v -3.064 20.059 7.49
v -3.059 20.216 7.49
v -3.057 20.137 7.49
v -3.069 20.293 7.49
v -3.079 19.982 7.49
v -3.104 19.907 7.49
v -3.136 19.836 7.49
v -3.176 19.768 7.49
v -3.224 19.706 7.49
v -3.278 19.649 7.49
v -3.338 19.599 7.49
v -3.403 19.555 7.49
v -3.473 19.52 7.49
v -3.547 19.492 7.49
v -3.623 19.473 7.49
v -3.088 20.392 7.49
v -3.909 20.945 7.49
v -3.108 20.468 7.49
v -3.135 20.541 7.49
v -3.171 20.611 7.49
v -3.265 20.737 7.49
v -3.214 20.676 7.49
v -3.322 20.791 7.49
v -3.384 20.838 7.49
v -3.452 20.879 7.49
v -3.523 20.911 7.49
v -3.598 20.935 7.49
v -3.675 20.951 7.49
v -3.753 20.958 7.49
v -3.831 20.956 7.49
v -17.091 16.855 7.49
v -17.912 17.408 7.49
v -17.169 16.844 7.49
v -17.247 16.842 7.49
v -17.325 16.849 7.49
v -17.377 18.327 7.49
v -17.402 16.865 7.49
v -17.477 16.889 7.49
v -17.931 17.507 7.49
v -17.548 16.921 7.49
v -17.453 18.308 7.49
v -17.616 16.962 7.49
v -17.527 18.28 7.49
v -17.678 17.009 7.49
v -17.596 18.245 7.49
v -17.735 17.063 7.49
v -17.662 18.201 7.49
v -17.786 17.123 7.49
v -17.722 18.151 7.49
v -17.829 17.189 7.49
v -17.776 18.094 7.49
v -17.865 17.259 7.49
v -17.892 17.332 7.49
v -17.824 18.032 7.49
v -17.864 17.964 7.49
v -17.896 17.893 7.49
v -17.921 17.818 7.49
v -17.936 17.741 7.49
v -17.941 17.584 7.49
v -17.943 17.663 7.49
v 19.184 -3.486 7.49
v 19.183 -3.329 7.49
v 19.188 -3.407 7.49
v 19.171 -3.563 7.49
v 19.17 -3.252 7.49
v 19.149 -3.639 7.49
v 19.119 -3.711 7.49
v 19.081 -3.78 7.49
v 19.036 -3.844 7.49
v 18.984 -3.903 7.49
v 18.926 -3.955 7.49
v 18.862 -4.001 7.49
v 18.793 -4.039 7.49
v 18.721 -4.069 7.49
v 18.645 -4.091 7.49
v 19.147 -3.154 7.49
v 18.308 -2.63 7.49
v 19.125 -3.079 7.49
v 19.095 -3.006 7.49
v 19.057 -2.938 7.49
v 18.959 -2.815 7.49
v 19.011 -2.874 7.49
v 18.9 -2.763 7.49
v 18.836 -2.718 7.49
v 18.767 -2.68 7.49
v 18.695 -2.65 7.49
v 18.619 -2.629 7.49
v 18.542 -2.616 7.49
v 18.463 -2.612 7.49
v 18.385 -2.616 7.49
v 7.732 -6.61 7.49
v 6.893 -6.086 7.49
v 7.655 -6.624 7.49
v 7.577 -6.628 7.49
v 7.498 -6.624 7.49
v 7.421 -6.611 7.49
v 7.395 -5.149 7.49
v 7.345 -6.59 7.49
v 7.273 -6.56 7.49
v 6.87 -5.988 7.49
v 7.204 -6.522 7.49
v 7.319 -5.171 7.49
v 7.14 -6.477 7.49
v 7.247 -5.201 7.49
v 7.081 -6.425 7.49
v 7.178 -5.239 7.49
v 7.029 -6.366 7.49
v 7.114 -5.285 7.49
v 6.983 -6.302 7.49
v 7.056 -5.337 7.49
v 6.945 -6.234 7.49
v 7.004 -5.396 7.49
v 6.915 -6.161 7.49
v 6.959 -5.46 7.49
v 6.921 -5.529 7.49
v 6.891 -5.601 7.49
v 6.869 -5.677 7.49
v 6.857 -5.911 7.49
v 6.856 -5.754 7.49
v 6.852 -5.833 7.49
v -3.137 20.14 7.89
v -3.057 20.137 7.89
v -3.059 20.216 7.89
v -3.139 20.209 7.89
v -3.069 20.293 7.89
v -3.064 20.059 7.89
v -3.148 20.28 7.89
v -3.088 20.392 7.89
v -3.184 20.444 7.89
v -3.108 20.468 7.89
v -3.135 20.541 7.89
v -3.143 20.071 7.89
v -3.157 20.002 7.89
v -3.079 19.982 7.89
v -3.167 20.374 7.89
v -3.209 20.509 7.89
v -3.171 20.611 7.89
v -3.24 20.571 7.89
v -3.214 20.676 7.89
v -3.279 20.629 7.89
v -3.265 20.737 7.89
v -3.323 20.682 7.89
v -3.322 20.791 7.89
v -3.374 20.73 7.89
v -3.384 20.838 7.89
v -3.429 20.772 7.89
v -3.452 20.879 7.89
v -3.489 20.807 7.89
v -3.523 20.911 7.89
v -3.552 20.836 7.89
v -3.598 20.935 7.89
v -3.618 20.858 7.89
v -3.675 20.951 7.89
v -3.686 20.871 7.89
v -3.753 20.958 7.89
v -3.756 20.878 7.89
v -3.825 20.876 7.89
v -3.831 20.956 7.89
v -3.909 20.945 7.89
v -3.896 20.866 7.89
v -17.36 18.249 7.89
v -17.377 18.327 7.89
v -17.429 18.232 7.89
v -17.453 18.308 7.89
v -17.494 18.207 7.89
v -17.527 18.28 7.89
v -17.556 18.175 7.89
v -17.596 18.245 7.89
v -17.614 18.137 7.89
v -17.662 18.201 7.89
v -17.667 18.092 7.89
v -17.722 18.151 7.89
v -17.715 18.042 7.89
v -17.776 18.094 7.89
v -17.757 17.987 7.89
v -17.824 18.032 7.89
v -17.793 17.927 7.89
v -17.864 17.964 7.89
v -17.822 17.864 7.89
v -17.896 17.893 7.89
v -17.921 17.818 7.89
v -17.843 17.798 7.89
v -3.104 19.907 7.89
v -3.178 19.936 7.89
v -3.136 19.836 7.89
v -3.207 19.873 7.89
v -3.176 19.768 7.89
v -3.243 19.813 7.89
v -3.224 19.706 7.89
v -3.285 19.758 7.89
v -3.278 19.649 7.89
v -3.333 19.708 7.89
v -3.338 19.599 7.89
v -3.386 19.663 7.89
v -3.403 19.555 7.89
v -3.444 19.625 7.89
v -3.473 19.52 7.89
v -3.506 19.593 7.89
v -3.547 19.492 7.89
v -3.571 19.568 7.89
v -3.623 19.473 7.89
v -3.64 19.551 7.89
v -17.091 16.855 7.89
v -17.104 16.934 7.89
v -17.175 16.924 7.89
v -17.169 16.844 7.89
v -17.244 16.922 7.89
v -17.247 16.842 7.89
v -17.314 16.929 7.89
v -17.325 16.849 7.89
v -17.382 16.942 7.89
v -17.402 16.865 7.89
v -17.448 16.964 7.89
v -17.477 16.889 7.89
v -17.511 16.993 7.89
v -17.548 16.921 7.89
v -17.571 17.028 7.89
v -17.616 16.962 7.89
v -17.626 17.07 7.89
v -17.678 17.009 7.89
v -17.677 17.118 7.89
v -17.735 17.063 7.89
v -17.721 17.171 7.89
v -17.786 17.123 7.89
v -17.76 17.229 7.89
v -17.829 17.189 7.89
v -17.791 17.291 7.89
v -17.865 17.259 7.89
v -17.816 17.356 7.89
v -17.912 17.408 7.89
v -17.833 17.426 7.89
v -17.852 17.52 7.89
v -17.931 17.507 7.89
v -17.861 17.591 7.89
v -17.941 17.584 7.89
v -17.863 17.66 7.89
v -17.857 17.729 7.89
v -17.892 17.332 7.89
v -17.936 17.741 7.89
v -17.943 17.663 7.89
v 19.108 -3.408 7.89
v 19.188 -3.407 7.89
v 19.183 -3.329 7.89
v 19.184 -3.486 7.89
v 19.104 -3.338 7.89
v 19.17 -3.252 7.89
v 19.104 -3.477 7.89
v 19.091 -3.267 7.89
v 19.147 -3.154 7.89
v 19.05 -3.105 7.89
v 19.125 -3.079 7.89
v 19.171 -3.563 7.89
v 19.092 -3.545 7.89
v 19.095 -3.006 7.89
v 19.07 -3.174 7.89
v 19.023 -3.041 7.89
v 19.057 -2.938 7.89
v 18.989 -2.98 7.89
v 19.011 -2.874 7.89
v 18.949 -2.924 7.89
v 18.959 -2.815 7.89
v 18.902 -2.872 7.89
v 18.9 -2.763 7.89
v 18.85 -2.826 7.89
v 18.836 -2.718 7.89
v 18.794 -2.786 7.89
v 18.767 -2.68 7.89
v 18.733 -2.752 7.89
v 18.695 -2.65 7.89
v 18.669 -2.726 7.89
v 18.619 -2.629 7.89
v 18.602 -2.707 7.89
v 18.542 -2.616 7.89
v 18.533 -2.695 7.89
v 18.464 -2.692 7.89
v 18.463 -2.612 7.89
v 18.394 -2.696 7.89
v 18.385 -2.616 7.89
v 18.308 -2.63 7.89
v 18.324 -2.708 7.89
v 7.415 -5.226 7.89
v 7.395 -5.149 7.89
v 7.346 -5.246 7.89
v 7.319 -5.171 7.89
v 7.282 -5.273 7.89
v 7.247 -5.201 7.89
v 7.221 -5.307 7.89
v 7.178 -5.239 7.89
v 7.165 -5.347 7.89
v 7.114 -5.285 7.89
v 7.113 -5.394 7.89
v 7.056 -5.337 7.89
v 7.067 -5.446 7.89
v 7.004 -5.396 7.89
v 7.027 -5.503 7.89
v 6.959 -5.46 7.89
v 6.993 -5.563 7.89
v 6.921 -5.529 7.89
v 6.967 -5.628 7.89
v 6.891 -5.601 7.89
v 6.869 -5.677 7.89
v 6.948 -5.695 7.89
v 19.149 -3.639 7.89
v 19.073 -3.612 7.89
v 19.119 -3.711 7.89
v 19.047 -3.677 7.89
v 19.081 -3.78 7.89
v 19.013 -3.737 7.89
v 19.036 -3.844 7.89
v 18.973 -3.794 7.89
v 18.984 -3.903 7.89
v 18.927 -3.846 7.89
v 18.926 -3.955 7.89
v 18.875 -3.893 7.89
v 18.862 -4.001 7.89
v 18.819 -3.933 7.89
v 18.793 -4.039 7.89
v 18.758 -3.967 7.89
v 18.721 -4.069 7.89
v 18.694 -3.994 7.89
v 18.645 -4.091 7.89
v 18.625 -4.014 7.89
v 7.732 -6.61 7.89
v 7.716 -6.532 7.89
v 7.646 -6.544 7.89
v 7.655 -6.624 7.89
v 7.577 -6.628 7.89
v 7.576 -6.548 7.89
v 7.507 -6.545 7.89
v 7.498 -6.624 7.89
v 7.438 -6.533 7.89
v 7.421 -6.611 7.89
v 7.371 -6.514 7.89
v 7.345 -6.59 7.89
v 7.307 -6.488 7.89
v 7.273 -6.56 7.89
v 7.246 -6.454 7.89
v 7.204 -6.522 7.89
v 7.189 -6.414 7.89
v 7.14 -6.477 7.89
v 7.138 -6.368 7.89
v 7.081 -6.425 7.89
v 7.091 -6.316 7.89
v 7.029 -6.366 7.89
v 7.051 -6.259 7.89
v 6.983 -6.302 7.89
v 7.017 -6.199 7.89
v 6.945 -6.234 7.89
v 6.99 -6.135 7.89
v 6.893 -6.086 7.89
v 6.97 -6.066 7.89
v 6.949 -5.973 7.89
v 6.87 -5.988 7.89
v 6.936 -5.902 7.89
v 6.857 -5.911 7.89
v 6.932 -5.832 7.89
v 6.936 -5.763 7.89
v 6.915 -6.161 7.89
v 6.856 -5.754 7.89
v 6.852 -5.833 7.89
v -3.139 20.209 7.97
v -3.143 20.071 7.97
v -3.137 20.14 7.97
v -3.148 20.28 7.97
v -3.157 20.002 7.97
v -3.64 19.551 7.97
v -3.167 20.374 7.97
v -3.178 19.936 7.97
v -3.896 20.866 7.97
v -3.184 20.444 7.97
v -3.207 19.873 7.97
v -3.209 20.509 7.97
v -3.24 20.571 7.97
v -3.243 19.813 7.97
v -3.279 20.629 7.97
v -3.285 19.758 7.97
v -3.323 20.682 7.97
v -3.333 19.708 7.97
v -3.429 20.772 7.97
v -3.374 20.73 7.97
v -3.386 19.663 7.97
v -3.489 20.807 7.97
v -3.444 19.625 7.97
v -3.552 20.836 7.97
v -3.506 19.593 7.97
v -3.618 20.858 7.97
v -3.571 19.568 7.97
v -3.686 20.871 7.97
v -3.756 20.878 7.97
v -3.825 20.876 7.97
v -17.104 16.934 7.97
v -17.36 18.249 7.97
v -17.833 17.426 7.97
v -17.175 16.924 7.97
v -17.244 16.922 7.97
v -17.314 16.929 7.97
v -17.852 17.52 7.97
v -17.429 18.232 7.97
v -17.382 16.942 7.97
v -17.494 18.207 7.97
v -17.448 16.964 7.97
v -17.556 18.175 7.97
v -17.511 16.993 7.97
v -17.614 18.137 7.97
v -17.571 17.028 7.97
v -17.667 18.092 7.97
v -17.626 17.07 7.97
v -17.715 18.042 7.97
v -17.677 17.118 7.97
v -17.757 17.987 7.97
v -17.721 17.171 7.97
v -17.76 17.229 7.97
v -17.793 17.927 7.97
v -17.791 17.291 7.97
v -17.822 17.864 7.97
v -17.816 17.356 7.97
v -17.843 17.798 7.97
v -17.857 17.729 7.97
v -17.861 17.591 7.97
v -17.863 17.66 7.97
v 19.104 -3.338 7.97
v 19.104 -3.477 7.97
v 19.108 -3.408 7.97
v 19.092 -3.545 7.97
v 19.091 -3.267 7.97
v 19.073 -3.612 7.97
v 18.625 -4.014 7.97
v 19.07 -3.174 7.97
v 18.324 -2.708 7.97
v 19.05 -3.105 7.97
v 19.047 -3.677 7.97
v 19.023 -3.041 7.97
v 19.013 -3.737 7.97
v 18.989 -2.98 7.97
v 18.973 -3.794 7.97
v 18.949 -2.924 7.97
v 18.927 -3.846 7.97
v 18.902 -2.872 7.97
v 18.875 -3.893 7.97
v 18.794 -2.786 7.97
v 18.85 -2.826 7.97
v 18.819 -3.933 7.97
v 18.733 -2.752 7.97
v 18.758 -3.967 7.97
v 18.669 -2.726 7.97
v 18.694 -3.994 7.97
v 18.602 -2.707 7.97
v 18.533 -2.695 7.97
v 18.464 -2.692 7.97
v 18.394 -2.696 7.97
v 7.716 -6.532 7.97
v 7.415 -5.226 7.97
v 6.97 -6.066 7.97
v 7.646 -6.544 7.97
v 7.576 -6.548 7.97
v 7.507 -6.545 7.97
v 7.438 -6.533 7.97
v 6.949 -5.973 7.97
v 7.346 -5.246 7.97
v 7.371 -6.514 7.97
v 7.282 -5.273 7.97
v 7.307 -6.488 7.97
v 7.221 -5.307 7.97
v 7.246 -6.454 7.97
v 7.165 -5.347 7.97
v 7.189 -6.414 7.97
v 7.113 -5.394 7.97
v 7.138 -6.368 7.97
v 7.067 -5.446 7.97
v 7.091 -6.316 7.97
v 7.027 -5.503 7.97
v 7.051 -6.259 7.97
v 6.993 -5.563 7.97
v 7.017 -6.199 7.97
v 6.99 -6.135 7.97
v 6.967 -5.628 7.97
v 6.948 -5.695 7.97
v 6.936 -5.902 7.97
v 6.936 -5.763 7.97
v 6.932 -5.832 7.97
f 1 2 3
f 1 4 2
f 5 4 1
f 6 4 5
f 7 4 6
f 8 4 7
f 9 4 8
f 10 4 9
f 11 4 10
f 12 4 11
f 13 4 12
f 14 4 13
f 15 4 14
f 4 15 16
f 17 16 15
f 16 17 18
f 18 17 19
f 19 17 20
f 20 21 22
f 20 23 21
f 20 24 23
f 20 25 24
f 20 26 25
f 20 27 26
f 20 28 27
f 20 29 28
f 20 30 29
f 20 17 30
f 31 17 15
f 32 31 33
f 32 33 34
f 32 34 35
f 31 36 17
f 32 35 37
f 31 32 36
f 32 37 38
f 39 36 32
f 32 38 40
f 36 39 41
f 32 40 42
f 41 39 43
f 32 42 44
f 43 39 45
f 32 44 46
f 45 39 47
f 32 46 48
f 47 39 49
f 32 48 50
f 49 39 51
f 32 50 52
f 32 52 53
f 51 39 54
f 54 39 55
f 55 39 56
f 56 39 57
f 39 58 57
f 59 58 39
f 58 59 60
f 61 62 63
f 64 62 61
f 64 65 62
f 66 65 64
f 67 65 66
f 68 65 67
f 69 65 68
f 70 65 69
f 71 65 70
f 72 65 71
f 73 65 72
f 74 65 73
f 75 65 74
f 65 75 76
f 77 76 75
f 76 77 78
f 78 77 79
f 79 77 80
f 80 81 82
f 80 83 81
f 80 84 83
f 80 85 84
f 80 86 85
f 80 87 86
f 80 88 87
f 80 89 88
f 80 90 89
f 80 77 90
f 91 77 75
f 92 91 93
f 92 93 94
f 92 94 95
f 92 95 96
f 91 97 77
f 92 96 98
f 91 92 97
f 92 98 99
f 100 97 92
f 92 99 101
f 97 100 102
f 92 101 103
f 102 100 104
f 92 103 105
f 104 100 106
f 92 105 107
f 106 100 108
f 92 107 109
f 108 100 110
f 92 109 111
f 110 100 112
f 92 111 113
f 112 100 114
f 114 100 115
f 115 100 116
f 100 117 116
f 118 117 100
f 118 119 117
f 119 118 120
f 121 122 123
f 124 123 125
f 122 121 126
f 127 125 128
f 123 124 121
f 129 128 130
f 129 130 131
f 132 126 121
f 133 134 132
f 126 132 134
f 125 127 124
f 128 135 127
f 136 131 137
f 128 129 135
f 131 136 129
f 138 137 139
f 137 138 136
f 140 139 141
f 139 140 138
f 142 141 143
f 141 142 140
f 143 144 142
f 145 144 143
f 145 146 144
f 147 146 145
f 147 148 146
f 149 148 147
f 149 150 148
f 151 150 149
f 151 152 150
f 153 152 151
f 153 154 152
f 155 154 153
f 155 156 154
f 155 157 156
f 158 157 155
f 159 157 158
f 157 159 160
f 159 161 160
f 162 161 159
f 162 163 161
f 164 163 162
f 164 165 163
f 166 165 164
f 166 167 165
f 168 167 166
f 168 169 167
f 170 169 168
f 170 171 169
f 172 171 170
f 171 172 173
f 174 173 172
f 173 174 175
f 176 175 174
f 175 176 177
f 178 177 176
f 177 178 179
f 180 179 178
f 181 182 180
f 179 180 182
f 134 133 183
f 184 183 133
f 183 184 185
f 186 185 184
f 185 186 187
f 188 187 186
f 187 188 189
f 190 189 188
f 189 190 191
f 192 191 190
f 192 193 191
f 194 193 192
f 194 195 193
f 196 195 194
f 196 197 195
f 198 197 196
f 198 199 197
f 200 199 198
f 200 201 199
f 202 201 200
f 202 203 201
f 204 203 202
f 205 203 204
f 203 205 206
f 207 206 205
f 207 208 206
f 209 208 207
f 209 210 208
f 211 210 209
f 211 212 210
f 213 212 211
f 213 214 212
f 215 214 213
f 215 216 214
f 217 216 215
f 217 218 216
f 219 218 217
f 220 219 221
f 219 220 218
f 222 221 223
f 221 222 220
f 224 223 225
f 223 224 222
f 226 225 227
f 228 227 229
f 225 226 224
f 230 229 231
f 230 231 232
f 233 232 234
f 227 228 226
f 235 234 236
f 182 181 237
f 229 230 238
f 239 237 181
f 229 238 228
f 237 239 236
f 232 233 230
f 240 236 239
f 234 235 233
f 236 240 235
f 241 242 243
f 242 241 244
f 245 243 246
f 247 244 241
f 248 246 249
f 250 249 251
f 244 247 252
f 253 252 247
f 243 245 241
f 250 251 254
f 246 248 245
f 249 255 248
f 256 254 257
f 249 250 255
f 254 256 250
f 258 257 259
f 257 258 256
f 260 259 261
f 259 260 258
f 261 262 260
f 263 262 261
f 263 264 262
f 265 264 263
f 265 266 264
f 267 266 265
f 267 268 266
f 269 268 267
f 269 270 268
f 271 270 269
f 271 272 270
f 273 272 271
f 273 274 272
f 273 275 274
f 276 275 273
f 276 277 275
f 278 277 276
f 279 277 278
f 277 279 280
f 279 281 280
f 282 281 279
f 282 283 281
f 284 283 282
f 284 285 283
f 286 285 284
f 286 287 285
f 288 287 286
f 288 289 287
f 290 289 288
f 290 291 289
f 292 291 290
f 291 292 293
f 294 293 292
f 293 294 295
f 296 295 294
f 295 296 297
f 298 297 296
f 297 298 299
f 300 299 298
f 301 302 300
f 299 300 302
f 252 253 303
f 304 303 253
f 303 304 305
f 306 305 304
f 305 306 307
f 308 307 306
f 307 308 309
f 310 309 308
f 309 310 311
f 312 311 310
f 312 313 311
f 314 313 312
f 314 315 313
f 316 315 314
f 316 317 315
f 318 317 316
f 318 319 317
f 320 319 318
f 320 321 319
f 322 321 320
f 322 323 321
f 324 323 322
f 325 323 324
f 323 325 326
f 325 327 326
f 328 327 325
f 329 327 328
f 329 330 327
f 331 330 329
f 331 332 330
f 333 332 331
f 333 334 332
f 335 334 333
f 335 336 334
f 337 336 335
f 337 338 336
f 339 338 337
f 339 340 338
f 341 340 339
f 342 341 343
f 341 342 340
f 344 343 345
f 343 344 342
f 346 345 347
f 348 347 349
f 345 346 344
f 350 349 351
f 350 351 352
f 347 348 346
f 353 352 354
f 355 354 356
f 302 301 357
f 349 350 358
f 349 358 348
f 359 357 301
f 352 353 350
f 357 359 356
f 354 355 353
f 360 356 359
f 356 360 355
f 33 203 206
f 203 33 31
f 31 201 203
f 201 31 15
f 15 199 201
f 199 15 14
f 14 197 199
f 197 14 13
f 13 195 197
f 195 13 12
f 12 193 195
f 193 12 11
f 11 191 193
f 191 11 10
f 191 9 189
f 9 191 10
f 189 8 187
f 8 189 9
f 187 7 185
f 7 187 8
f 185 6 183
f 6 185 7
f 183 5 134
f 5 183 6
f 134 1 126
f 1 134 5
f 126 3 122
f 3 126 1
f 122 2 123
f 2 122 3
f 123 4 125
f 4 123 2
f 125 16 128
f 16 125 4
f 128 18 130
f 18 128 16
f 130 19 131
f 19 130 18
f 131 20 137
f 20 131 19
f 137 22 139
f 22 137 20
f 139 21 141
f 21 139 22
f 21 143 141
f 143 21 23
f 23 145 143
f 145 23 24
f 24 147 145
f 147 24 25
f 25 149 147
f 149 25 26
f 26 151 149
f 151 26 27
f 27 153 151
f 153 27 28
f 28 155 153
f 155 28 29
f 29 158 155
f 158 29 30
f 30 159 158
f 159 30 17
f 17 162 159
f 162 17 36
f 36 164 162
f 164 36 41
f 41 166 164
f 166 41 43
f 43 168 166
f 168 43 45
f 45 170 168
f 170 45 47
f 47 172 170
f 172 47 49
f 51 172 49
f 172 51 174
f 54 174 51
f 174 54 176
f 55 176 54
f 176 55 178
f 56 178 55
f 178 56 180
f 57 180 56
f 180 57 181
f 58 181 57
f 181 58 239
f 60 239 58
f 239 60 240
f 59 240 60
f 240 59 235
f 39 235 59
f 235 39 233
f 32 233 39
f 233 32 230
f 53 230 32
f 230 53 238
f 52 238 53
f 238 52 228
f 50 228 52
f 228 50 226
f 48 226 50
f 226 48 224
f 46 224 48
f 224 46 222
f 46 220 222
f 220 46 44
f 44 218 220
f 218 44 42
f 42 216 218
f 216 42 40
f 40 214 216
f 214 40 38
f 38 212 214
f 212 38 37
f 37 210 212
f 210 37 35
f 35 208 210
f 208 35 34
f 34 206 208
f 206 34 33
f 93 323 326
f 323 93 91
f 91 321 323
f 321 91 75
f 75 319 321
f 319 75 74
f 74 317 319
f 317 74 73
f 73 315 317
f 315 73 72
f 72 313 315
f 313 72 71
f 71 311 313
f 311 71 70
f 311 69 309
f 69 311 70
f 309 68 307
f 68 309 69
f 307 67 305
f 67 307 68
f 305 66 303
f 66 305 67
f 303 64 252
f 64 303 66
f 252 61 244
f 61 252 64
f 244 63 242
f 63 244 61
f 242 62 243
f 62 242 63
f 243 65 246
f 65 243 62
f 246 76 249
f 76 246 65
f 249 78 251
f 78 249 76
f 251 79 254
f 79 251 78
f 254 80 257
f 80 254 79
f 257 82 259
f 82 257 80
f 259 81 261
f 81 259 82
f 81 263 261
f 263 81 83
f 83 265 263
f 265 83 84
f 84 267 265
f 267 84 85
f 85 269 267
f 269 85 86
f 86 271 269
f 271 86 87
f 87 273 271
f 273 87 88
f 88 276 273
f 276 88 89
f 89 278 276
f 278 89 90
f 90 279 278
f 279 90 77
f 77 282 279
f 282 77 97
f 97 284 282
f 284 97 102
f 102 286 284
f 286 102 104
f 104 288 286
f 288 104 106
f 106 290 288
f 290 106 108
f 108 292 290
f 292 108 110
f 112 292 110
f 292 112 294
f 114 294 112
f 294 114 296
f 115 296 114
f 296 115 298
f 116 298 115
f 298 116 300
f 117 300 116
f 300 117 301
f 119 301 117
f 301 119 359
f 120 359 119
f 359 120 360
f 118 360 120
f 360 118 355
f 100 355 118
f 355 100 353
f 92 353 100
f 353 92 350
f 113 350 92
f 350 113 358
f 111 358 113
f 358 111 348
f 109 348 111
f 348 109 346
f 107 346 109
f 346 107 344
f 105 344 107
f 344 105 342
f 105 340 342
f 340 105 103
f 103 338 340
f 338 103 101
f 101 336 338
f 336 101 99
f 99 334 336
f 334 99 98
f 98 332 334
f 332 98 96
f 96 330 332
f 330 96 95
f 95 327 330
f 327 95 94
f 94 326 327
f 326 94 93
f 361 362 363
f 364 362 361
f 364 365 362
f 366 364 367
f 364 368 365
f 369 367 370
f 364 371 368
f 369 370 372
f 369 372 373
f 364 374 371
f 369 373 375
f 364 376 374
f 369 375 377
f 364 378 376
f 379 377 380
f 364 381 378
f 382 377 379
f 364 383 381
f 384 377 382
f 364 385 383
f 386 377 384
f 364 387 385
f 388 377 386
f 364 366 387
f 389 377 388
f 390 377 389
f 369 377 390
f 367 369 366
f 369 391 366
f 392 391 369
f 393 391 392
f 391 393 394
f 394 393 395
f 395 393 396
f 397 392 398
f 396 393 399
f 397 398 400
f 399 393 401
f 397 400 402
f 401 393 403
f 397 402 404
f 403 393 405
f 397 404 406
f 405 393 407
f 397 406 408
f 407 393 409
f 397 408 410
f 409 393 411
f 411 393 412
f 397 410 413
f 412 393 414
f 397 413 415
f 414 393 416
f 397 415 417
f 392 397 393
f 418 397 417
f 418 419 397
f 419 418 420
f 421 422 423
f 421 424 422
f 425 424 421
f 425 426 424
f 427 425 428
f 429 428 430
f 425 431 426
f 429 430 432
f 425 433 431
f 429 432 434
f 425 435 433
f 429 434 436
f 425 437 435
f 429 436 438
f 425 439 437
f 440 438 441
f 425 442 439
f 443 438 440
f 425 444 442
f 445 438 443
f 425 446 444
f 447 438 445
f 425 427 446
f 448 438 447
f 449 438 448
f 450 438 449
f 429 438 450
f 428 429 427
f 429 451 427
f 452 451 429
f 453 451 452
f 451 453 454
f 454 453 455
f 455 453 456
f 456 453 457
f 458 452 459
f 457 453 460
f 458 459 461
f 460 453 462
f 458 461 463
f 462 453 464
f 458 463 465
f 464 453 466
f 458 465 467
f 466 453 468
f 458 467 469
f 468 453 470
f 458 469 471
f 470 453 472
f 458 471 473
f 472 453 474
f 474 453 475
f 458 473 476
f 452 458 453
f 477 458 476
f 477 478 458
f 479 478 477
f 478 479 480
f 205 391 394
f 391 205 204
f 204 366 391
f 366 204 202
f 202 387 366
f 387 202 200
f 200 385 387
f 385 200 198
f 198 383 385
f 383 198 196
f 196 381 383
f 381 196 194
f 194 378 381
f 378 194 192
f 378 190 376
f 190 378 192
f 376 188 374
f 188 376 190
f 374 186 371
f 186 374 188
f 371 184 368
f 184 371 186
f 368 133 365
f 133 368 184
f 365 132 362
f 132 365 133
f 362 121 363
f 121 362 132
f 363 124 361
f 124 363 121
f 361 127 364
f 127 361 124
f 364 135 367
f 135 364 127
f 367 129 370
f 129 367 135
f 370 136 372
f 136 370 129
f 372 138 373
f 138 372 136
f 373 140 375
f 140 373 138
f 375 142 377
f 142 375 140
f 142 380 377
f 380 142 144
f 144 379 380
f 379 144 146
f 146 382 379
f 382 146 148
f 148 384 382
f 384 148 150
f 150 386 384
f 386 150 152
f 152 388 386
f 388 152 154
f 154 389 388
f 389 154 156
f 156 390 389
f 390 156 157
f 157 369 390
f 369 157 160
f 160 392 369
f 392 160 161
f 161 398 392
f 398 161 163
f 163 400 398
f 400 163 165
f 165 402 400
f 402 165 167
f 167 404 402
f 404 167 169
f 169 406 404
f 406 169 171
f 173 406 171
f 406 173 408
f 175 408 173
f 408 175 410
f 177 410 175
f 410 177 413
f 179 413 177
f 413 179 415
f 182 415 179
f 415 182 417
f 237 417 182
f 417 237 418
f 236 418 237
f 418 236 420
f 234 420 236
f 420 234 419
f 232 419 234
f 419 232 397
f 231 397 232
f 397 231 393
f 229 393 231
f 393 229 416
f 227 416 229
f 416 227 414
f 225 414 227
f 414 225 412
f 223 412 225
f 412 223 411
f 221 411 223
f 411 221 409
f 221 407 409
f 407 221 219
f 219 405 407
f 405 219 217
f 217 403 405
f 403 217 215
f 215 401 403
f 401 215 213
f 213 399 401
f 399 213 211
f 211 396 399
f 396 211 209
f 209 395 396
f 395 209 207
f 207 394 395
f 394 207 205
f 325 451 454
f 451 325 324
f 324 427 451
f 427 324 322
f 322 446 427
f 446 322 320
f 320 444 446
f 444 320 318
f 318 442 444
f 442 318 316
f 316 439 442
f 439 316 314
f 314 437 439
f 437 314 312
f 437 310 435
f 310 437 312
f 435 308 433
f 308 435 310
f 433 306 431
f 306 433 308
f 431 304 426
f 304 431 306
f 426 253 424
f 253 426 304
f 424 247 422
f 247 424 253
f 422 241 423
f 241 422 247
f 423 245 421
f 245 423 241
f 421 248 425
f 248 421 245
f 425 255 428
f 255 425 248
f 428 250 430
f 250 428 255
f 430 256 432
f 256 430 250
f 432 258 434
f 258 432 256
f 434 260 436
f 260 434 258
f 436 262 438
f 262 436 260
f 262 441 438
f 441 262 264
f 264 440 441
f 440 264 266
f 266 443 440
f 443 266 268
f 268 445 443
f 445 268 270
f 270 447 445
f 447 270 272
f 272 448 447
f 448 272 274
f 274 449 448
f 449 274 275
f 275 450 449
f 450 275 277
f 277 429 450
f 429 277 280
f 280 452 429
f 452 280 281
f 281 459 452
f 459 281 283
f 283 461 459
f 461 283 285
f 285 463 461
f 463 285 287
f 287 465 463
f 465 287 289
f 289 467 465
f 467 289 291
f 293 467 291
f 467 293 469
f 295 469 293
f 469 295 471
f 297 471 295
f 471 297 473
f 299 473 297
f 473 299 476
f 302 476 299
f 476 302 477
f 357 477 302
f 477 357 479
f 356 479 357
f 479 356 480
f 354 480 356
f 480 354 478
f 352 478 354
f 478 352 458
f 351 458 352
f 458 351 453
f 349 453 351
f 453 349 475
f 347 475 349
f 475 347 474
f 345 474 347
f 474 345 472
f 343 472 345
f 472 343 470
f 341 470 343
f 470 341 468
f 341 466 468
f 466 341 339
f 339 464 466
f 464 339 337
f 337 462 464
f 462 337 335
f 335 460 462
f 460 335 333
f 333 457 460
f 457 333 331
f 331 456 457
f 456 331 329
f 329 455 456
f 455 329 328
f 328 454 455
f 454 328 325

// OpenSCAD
part_index_override = 5;
size_index_override = 0;
bail_index_override = 0;
include <../softball_A_chain_pendant.scad>
